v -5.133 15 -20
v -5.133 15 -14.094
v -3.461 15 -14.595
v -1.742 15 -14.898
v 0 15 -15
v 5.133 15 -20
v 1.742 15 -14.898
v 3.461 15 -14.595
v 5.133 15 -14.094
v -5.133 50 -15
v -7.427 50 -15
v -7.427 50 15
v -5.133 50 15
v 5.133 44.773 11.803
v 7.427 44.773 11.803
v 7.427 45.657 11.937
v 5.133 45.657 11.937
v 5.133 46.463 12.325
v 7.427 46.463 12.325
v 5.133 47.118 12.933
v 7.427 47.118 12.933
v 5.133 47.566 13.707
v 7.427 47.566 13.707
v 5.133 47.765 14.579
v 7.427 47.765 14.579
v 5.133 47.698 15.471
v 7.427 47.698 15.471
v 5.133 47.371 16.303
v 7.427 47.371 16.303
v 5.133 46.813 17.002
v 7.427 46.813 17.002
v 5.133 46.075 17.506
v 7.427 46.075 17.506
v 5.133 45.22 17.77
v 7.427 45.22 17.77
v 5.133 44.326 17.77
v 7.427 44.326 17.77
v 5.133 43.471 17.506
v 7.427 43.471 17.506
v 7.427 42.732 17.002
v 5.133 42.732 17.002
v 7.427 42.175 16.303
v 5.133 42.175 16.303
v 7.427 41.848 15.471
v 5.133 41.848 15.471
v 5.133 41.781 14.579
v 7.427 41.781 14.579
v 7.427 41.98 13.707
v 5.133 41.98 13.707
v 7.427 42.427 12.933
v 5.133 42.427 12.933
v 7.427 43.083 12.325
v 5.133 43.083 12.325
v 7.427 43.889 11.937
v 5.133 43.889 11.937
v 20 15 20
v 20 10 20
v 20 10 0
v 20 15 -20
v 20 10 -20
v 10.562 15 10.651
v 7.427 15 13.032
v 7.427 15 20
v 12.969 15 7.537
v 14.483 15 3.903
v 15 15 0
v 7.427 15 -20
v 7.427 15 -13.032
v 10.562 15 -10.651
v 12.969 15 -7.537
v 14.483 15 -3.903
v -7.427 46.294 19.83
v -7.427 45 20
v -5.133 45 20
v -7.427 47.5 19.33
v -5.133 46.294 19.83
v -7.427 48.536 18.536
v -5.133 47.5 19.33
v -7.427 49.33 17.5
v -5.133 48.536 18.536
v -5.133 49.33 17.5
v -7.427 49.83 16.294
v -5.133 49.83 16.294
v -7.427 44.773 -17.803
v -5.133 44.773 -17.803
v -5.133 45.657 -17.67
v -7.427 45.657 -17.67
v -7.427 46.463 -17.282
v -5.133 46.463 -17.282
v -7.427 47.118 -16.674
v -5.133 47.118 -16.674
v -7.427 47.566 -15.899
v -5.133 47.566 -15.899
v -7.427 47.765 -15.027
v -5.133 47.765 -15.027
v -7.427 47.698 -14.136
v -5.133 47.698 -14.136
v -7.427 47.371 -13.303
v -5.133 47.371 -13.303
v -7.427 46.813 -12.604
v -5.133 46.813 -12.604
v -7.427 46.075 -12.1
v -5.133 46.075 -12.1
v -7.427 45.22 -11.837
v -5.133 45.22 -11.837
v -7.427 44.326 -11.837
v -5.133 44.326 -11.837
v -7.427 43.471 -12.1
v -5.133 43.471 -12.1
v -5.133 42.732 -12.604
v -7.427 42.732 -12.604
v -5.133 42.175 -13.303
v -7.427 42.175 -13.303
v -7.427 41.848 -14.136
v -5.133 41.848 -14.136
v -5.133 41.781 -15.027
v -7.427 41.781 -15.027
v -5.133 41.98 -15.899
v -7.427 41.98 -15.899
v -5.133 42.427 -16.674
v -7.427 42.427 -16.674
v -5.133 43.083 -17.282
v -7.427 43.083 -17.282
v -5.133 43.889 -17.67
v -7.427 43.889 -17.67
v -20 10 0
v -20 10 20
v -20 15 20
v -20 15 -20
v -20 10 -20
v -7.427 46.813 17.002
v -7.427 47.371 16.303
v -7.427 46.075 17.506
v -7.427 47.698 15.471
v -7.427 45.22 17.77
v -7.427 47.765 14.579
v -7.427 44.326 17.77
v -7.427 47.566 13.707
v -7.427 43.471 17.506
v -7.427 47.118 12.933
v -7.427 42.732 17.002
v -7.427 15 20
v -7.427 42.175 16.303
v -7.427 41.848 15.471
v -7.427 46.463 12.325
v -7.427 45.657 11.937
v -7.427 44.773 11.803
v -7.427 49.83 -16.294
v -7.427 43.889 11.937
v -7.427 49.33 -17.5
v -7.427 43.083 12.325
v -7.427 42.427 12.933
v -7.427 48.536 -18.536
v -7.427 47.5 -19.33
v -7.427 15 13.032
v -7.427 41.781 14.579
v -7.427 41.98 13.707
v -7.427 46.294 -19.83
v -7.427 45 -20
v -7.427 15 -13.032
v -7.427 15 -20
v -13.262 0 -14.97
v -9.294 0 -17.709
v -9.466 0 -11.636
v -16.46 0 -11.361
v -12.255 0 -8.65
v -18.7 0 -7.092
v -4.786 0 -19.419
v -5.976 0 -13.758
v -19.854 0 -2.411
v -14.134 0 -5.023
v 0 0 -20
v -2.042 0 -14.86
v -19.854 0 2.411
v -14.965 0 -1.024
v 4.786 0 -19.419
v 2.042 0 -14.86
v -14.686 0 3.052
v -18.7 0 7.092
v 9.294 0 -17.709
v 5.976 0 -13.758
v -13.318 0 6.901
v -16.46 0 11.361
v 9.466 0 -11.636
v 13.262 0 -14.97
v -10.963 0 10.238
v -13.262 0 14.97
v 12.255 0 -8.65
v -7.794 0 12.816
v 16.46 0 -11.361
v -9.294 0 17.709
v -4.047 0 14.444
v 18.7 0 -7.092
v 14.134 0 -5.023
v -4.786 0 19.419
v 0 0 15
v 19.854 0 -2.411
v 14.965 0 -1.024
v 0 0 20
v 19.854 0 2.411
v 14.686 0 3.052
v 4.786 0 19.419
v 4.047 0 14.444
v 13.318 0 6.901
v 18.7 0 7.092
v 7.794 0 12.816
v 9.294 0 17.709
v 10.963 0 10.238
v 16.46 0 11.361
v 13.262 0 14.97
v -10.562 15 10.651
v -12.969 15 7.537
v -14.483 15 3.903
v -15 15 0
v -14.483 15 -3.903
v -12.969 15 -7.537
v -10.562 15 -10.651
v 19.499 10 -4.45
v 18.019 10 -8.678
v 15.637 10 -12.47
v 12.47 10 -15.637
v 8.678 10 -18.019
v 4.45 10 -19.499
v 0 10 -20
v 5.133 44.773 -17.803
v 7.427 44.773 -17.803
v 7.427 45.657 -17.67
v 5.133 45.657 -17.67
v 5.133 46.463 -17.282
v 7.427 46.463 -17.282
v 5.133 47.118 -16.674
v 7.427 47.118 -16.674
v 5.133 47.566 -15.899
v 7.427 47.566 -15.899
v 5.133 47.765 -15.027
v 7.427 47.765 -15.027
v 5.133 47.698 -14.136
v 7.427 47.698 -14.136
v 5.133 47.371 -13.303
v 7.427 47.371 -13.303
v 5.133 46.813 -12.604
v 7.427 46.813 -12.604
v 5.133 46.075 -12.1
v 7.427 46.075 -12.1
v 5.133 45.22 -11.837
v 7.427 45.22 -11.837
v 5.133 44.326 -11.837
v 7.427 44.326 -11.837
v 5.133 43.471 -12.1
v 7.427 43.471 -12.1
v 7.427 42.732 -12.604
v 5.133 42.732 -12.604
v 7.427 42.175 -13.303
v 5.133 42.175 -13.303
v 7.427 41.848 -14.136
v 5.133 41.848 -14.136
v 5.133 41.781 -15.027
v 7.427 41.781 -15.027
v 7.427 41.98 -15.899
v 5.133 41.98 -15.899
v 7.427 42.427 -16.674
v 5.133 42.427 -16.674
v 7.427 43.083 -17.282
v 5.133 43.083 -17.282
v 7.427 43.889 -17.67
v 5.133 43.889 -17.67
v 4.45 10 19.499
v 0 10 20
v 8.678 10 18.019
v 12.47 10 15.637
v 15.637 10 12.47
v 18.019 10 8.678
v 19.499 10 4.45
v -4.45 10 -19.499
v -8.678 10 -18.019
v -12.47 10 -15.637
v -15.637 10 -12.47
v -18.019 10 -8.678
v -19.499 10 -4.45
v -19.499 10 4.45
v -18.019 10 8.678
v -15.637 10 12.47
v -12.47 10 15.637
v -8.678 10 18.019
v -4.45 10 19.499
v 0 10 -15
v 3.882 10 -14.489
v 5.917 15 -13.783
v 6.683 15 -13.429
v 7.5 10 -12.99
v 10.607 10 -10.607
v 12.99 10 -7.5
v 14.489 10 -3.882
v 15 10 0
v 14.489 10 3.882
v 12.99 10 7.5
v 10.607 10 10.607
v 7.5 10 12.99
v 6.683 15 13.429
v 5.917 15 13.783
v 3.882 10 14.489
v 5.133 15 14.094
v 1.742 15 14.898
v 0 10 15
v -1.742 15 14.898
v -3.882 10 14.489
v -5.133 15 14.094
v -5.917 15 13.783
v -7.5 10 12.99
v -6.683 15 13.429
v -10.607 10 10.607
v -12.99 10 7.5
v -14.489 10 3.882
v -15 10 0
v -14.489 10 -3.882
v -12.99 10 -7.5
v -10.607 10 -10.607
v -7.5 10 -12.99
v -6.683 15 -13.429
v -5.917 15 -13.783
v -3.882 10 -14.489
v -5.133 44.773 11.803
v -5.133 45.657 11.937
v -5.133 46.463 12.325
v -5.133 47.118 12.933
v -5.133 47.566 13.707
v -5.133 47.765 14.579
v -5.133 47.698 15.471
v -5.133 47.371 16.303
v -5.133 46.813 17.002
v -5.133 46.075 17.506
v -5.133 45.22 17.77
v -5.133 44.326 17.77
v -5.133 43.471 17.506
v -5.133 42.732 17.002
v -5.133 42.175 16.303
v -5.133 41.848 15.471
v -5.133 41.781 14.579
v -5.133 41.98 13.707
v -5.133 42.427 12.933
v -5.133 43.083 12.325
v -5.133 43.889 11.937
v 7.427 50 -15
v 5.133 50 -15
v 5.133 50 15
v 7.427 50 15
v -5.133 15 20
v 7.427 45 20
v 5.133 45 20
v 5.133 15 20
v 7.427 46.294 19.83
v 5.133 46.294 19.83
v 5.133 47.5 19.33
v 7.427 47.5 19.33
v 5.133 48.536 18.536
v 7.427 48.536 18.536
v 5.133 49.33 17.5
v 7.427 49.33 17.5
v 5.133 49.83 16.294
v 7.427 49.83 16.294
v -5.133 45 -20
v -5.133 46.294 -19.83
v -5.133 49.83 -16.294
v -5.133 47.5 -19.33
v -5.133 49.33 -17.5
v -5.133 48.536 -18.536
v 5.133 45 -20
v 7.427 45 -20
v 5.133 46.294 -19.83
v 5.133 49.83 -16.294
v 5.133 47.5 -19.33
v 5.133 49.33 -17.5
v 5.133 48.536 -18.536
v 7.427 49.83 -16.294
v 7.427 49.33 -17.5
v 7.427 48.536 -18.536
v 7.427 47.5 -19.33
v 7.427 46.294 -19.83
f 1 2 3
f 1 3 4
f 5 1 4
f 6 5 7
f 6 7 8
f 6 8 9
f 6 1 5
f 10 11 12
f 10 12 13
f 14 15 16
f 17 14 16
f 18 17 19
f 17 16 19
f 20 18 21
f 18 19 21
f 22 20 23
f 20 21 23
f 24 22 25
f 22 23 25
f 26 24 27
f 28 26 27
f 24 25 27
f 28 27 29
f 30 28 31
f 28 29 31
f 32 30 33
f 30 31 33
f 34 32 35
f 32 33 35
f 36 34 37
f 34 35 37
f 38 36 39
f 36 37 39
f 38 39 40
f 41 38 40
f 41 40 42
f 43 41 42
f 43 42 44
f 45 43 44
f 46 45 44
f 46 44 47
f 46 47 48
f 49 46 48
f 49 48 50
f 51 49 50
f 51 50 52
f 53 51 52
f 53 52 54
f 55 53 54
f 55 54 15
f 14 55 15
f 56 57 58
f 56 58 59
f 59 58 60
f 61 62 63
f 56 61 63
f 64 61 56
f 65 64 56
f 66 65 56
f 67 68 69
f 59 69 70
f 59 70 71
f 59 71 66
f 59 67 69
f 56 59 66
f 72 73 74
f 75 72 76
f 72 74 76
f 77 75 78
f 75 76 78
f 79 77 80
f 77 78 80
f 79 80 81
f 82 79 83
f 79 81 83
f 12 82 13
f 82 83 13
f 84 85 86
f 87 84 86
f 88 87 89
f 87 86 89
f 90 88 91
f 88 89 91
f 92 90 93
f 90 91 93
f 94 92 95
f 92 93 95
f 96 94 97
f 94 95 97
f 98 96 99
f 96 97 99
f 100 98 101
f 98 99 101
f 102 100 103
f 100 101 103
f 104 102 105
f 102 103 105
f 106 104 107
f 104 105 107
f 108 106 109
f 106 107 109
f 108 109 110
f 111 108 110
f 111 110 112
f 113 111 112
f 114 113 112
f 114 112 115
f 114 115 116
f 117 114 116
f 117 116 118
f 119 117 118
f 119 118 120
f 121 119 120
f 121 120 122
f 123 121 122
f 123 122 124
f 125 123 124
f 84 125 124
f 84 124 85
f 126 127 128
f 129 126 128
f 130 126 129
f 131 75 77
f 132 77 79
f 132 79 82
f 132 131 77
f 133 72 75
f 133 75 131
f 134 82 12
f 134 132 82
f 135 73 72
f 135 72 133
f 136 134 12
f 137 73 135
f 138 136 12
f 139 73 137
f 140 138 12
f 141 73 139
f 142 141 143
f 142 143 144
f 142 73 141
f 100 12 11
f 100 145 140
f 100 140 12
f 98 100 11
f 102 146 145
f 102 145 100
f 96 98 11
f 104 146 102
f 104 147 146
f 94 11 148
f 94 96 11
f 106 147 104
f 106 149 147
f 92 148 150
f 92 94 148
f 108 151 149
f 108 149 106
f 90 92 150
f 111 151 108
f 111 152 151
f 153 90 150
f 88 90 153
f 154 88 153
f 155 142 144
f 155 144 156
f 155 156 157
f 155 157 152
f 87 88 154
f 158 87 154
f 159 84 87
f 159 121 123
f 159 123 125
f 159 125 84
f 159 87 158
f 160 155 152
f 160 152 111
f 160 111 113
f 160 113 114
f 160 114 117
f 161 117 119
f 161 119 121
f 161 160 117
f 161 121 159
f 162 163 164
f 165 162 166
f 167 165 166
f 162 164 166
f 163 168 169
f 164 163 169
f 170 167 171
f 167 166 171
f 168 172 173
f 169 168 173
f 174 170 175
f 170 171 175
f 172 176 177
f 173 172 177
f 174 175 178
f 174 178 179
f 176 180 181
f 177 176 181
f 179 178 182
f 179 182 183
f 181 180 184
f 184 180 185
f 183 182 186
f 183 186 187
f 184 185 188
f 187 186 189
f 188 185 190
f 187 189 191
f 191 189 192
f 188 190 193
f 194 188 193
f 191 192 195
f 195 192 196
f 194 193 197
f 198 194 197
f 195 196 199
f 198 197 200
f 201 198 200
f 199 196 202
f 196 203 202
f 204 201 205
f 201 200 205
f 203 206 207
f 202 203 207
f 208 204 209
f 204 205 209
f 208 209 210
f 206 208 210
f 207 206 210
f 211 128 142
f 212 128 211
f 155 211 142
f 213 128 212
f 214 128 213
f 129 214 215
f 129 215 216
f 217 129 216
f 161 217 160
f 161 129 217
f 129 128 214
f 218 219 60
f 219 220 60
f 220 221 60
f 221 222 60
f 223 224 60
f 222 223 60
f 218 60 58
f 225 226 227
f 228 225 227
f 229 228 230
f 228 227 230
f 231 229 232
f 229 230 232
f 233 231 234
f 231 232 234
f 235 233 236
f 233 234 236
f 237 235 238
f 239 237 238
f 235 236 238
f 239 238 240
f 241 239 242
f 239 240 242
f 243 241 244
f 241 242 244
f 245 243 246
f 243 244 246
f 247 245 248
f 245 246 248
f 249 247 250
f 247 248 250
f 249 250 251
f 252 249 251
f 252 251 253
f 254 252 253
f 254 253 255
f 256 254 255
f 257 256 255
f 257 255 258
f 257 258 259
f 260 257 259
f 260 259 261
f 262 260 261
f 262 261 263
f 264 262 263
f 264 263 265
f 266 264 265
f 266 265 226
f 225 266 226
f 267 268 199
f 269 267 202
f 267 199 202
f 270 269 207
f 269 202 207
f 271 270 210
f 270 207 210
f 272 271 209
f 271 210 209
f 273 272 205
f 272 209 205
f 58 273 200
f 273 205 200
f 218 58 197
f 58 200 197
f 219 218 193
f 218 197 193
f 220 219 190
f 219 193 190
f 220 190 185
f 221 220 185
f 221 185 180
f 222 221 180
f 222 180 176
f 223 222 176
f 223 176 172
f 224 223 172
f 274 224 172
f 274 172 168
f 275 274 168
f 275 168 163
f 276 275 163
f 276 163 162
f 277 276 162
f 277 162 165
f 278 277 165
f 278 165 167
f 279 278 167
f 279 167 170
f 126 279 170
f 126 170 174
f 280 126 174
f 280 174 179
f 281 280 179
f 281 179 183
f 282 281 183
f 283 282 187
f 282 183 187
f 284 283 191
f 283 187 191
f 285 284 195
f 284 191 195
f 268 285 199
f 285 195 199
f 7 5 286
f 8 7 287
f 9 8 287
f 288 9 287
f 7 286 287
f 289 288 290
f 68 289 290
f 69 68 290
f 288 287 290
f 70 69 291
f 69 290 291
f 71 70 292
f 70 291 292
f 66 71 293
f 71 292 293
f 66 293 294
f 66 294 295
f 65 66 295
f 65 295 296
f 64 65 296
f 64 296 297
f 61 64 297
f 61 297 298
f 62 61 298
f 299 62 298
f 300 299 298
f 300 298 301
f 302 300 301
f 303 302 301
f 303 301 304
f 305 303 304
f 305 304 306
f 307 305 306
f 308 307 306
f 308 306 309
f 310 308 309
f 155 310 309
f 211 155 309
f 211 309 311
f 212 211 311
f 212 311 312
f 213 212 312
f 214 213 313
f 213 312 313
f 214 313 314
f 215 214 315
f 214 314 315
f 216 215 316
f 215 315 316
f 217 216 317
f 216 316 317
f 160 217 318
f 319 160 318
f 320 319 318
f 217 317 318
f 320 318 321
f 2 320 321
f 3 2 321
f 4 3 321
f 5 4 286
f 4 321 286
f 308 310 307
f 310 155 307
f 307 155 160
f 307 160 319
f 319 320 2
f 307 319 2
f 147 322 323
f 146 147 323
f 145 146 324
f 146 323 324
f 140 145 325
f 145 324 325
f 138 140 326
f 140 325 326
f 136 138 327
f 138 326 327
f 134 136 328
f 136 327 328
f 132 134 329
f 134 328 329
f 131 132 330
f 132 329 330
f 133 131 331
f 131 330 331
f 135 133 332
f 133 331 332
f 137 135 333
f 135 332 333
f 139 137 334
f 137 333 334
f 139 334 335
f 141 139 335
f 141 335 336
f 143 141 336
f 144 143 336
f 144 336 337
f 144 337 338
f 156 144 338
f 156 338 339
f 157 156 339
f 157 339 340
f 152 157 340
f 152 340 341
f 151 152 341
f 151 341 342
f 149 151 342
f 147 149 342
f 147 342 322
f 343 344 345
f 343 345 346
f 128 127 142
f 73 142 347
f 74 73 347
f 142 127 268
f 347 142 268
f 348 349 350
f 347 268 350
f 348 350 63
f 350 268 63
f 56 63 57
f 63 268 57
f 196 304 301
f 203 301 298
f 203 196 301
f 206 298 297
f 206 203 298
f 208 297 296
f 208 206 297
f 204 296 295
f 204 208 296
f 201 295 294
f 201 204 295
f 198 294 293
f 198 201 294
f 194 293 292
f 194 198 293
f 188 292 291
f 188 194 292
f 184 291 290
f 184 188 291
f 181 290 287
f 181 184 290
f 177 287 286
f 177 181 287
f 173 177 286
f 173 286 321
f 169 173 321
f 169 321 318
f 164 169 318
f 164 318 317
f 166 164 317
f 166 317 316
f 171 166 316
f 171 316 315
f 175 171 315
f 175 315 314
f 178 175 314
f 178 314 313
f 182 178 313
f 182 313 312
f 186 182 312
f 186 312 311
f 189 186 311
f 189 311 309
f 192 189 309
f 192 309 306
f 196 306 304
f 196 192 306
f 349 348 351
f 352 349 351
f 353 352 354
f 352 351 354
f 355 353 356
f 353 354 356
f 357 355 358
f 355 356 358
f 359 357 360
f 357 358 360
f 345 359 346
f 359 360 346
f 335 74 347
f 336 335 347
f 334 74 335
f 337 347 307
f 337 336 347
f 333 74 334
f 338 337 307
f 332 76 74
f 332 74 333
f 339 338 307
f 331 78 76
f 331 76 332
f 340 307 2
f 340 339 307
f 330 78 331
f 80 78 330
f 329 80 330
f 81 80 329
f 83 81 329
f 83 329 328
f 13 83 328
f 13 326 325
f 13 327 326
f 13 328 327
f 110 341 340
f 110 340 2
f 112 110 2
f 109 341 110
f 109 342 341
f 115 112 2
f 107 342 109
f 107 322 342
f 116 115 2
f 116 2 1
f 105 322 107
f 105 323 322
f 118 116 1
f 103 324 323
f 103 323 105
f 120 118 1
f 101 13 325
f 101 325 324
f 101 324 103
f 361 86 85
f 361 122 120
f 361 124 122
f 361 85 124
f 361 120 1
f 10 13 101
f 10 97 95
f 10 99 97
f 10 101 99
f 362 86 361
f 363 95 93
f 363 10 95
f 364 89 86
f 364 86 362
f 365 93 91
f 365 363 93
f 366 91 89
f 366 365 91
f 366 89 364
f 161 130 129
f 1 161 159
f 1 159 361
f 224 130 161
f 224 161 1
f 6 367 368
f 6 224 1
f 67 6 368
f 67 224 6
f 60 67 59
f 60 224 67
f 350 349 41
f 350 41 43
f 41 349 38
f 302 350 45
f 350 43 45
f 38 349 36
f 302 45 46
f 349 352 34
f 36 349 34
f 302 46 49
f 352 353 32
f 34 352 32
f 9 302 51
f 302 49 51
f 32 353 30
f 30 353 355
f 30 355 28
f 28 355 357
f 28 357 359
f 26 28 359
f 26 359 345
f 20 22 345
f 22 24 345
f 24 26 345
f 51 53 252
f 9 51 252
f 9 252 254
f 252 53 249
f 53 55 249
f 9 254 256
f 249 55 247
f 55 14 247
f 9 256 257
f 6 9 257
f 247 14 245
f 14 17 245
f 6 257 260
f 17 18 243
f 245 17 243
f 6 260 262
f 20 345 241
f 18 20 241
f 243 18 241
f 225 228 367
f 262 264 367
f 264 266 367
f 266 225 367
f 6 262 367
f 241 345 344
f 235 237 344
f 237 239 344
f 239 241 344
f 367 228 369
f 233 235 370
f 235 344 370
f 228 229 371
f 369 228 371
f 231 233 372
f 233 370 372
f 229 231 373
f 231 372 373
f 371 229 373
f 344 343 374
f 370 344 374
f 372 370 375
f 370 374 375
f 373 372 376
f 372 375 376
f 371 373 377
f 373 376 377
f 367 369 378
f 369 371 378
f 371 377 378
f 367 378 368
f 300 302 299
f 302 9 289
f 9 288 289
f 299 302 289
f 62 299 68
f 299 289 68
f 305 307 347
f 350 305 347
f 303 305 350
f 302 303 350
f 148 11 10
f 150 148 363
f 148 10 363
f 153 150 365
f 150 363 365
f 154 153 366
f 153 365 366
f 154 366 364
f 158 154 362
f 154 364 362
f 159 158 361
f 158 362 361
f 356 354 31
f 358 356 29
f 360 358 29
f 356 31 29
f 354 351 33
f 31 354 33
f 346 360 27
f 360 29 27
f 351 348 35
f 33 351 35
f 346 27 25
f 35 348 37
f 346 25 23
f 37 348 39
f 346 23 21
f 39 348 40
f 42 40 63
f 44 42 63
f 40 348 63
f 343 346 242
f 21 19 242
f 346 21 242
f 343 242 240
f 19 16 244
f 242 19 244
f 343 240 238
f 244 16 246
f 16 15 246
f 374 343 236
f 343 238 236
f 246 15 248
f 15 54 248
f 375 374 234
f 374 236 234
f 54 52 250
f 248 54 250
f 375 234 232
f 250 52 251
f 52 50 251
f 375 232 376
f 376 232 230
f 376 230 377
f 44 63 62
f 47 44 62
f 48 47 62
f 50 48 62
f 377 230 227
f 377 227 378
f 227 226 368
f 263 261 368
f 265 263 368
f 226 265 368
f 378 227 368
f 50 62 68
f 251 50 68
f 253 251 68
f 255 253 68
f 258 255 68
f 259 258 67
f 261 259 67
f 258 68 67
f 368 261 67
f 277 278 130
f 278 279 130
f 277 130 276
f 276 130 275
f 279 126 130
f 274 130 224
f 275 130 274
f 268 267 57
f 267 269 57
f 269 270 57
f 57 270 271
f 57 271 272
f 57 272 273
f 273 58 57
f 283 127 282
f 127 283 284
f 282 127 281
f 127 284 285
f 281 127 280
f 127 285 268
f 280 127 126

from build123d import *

# Parameters (mm, degrees)
SKETCH1_R           = 20
SKETCH1_R_2         = 15
BOSS_EXTRUDE1_DEPTH = 10
SKETCH3_W           = 40
SKETCH3_H           = 40
BOSS_EXTRUDE2_DEPTH = 5
SKETCH5_R           = 15
CUT_EXTRUDE1_DEPTH  = 5
SKETCH7_W           = 14.853626256
SKETCH7_H           = 40
BOSS_EXTRUDE3_DEPTH = 35
FILLET1_R           = 5
FILLET2_R           = 5
SKETCH8_R           = 3
CUT_EXTRUDE2_DEPTH  = 35
SKETCH9_W           = 10.266740892
SKETCH9_H           = 48.673472914
CUT_EXTRUDE5_DEPTH  = 35


with BuildPart() as part:
    # Sketch1 → Boss-Extrude1 (new body)
    with BuildSketch(Plane(origin=(0, 0, 0), x_dir=(1, 0, 0), z_dir=(0, 1, 0))):
        with Locations(Location((0, 0, 0), (0, 0, 270))):
            Circle(SKETCH1_R)
        with Locations(Location((0, 0, 0), (0, 0, 270))):
            Circle(SKETCH1_R_2, mode=Mode.SUBTRACT)
    extrude(amount=BOSS_EXTRUDE1_DEPTH)

    # Sketch3 → Boss-Extrude2 (add)
    with BuildSketch(Plane(origin=(0, 10, 0), x_dir=(1, 0, 0), z_dir=(0, 1, 0))):
        Rectangle(SKETCH3_W, SKETCH3_H)
    extrude(amount=BOSS_EXTRUDE2_DEPTH)

    # Sketch5 → Cut-Extrude1 (cut)
    with BuildSketch(Plane.XZ.offset(-10)):
        with Locations(Location((0, 0, 0), (0, 0, 270))):
            Circle(SKETCH5_R)
    extrude(amount=-CUT_EXTRUDE1_DEPTH, mode=Mode.SUBTRACT)

    # Sketch7 → Boss-Extrude3 (add)
    with BuildSketch(Plane(origin=(0, 15, 0), x_dir=(1, 0, 0), z_dir=(0, 1, 0))):
        Rectangle(SKETCH7_W, SKETCH7_H)
    extrude(amount=BOSS_EXTRUDE3_DEPTH)

    # Fillet1
    fillet1_edges = [part.edges().sort_by_distance(p)[0] for p in [
        (0, 50, 20),
    ]]
    fillet(fillet1_edges, radius=FILLET1_R)

    # Fillet2
    fillet2_edges = [part.edges().sort_by_distance(p)[0] for p in [
        (0, 50, -20),
    ]]
    fillet(fillet2_edges, radius=FILLET2_R)

    # Sketch8 → Cut-Extrude2 (cut)
    with BuildSketch(Plane(origin=(7.426813128, 0, 0), x_dir=(0, 0, -1), z_dir=(1, 0, 0))):
        with Locations((-14.80323114, 44.772968188)):
            Circle(SKETCH8_R)
        with Locations((14.80323114, 44.772968188)):
            Circle(SKETCH8_R)
    extrude(amount=-CUT_EXTRUDE2_DEPTH, mode=Mode.SUBTRACT)

    # Sketch9 → Cut-Extrude5 (cut)
    with BuildSketch(Plane(origin=(0, 50, 0), x_dir=(1, 0, 0), z_dir=(0, 1, 0))):
        Rectangle(SKETCH9_W, SKETCH9_H)
    extrude(amount=-CUT_EXTRUDE5_DEPTH, mode=Mode.SUBTRACT)


solid = part.part
